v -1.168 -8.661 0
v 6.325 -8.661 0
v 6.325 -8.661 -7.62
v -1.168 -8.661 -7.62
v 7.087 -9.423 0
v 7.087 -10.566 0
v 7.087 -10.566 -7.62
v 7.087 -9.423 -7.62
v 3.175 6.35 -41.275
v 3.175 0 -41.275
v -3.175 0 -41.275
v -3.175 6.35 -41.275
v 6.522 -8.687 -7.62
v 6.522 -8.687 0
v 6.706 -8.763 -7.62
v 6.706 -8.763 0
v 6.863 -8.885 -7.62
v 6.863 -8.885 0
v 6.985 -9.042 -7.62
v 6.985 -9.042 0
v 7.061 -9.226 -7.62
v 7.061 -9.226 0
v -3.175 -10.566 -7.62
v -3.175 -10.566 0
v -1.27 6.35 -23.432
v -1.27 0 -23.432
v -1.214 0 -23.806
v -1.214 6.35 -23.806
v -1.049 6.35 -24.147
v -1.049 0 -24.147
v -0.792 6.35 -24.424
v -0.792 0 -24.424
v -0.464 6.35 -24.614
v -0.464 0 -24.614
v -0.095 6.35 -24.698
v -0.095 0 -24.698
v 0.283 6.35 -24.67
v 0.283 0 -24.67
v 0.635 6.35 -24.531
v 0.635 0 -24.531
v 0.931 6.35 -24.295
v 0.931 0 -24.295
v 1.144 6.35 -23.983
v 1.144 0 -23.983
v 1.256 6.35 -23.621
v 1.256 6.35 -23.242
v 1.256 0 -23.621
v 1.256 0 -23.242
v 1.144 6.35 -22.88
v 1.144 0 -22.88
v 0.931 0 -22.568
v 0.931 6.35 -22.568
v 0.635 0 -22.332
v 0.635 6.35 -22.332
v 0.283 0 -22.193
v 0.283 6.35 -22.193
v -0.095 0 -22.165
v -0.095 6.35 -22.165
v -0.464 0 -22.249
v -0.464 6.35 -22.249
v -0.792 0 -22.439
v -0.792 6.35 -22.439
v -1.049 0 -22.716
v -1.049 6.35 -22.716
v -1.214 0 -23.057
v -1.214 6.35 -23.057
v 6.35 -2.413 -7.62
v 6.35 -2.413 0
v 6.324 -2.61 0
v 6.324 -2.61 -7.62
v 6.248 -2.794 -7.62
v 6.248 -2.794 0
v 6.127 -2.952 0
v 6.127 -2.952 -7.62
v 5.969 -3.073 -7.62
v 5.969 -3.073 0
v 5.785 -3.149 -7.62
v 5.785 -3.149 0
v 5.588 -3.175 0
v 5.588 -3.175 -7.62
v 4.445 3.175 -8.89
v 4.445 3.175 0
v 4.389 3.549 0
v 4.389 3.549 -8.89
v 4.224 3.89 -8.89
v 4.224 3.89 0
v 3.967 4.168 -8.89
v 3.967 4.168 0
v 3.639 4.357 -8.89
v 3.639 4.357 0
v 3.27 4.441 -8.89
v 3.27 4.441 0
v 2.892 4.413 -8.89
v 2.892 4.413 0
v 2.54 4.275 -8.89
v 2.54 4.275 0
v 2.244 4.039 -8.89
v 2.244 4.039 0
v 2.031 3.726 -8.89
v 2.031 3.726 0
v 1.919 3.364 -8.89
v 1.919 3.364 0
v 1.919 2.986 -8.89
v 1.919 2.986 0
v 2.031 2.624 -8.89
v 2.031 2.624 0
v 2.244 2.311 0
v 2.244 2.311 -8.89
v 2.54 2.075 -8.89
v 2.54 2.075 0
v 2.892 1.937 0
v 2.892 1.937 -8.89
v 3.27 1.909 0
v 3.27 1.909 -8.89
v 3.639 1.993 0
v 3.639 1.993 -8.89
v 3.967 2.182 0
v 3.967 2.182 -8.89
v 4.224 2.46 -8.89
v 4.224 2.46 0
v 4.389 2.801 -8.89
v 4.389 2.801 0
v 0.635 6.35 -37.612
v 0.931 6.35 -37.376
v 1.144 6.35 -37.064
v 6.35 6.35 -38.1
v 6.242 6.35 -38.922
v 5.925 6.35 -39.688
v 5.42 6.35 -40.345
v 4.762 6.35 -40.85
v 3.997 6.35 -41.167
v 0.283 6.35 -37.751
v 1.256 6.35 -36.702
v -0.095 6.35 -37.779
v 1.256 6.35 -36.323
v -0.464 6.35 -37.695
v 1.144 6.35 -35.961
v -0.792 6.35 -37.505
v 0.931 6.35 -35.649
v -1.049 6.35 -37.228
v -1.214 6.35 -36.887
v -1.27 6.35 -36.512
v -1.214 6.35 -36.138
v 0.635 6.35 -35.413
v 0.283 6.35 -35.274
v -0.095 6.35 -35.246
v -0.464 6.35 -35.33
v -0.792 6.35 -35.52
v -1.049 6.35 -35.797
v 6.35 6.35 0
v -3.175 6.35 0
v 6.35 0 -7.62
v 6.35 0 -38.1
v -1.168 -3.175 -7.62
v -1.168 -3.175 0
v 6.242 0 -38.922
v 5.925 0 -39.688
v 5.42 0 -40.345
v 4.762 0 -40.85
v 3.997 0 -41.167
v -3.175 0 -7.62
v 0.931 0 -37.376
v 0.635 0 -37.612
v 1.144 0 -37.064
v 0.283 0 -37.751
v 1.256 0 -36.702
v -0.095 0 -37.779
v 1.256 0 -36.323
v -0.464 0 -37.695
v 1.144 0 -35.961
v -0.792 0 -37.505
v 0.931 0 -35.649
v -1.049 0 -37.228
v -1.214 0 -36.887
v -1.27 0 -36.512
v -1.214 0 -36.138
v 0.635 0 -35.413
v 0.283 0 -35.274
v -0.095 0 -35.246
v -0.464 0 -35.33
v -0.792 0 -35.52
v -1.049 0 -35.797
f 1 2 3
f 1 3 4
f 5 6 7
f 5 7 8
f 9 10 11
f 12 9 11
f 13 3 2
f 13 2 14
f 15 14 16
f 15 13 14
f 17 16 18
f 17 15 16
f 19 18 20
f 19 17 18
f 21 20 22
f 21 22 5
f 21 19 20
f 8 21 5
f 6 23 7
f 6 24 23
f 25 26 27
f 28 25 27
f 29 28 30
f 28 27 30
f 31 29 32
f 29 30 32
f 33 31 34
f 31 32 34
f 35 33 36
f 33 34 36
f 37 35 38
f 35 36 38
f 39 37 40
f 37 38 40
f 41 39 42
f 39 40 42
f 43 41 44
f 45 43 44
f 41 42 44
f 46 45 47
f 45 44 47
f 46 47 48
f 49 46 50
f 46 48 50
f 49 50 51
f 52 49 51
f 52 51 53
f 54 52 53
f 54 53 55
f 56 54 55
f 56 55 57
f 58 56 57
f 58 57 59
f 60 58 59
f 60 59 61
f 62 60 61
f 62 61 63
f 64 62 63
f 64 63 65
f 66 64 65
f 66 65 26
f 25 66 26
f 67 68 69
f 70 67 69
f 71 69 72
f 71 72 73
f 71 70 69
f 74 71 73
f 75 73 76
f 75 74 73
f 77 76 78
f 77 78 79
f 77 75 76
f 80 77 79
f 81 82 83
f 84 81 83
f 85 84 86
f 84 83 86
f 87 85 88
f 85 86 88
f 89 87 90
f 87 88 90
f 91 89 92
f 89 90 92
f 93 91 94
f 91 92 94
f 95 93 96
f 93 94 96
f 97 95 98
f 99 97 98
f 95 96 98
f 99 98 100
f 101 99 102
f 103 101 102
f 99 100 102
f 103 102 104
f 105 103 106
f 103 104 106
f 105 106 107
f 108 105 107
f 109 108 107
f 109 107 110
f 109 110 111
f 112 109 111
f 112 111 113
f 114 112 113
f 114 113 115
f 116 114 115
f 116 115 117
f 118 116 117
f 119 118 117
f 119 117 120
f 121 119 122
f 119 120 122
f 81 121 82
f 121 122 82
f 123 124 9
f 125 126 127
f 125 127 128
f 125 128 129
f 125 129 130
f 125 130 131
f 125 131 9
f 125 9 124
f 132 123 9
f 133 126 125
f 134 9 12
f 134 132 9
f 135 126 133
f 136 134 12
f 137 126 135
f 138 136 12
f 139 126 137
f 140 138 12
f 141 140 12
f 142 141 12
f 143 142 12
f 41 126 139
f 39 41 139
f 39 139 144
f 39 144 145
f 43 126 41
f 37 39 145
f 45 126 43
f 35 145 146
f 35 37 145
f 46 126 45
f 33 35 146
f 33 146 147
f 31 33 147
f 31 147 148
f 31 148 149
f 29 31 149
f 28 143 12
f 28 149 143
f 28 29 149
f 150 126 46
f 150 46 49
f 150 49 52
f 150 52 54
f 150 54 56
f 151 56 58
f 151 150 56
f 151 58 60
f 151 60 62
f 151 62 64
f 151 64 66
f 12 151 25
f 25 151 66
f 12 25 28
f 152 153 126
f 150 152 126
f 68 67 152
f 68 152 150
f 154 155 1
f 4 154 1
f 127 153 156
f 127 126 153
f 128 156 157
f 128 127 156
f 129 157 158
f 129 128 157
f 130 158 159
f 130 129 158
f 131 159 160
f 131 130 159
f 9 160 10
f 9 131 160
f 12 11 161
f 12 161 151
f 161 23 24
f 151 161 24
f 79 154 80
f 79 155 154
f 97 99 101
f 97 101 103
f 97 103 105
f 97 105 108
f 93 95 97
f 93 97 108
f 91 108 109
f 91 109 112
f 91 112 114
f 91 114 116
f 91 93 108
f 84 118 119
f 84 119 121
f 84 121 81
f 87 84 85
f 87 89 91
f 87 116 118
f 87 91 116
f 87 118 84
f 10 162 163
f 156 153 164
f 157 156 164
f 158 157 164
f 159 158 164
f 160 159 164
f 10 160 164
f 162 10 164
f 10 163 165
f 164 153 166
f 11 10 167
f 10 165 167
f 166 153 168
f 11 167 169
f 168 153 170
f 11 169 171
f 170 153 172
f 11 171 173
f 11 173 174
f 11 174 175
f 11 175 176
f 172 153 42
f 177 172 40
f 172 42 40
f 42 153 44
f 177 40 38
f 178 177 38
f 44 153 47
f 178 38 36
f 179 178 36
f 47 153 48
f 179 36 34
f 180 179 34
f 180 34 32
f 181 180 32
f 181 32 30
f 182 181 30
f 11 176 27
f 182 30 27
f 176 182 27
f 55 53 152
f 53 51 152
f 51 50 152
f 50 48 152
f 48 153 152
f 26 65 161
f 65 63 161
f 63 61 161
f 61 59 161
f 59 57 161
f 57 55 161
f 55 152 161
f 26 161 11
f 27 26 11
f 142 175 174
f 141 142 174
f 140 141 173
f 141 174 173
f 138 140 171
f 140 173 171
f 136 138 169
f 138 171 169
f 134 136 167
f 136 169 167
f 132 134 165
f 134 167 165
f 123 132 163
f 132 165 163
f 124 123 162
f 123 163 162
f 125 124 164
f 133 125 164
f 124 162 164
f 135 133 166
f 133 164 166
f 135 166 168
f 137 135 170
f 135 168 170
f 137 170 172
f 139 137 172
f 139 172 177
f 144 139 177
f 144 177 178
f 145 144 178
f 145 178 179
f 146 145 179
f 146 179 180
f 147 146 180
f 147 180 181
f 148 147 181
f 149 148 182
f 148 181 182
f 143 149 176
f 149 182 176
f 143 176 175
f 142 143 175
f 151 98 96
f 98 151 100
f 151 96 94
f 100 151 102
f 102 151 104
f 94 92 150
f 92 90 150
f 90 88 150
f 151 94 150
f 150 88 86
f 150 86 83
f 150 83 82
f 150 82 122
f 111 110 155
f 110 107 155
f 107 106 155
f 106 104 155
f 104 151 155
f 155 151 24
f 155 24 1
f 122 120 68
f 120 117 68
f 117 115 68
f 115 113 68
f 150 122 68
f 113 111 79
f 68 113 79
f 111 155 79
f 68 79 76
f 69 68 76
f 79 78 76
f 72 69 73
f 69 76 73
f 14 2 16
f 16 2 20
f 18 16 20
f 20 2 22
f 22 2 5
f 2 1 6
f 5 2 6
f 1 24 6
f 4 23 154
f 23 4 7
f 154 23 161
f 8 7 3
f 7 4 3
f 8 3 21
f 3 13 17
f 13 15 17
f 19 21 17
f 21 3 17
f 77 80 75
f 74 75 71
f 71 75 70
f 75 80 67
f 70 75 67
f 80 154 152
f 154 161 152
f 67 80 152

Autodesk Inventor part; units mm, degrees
ref_plane "YZ Plane" through (0, 0, 0) normal (1, 0, 0) x (0, 1, 0)
ref_plane "XZ Plane" through (0, 0, 0) normal (0, 1, 0) x (-1, 0, 0)
ref_plane "XY Plane" through (0, 0, 0) normal (0, 0, 1) x (1, 0, 0)
sketch "Sketch1" plane through (0, 0, 0) normal (0, 1, 0) x (-1, 0, 0)
  line L0 (0, 0) -> (0, -41.275)
  line L1 (0, -41.275) -> (0, -36.5125)
  line L2 (0, -36.5125) -> (0, -23.4315)
  circle A0 centre (0, -36.5125) radius 1.27
  circle A1 centre (0, -23.4315) radius 1.27
  line L3 (0, -41.275) -> (3.175, -41.275)
  line L4 (3.175, -41.275) -> (3.175, 0)
  line L5 (3.175, 0) -> (0, 0)
  line L6 (0, -41.275) -> (-6.35, -41.275)
  line L7 (-6.35, -41.275) -> (-6.35, 0)
  line L8 (-6.35, 0) -> (0, 0)
  dimension "d0" = 41.275
  dimension "d1" = 4.7625
  dimension "d2" = 13.081
  dimension "d3" = 2.54
  dimension "d4" = 2.54
  dimension "d5" = 3.175
  dimension "d6" = 6.35
extrude "Extrusion1" add sketch "Sketch1" along normal blind 6.35
extrude "Extrusion2" cut sketch "Sketch1" along normal blind 6.35 contours A1 L0 | L0 A1 | A0 L0 | L0 A0
sketch "Sketch3" plane through (-3.175, 0, 0) normal (0, 0, 1) x (1, 0, 0)
  line L0 (0, 0) -> (9.525, 0) projected
  line L1 (9.525, 0) -> (9.525, 6.35) projected
  line L2 (0, 6.35) -> (9.525, 6.35) projected
  line L3 (0, 0) -> (0, 6.35) projected
  circle A0 centre (6.35, 3.175) radius 1.27
  line L4 (6.35, 3.175) -> (2.0066, 3.175)
  line L5 (2.0066, 3.175) -> (2.0066, 0)
  line L6 (9.525, 0) -> (0, 0) projected
  line L7 (6.35, 3.175) -> (6.35, -8.6614)
  line L8 (2.0066, 0) -> (2.0066, -8.6614)
  line L9 (2.0066, -8.6614) -> (2.0066, -10.5664)
  line L10 (2.0066, -10.5664) -> (10.2616, -10.5664)
  line L11 (10.2616, -10.5664) -> (10.2616, -8.6614)
  line L12 (10.2616, -8.6614) -> (6.35, -8.6614)
  line L13 (0, 0) -> (0, -10.5664)
  line L14 (0, -10.5664) -> (2.0066, -10.5664)
  line L15 (0, 0) -> (2.0066, 0)
  line L16 (6.35, -8.6614) -> (2.0066, -8.6614)
  line L17 (2.0066, -8.6614) -> (2.0066, 0)
  line L18 (6.35, 3.175) -> (6.35, -3.175)
  line L19 (9.525, 0) -> (2.0066, 0)
  line L20 (2.0066, 0) -> (2.0066, -3.175)
  line L21 (2.0066, -3.175) -> (9.525, -3.175)
  line L22 (9.525, -3.175) -> (9.525, 0)
  point P0 (3.175, 0)
  dimension "d11" = 2.54
  dimension "d14" = 3.175
  dimension "d15" = 9.525
  dimension "d16" = 4.3434
  dimension "d17" = 11.8364
  dimension "d18" = 1.905
  dimension "d19" = 8.255
  dimension "d22" = 6.35
extrude "Extrusion3" cut sketch "Sketch3" against normal blind 8.89 contours L7 L4 A0 | A0 L4 L7
extrude "Extrusion4" add sketch "Sketch3" against normal blind 7.62 contours L0 L8 L9 L14 L13 | L9 L16 L12 L11 L10
extrude "Extrusion5" add sketch "Sketch3" against normal blind 7.62 contours L0 L7 L21 L8 | L0 L22 L21 L7
fillet "Fillet1" radius 3.175 1 edges at (6.35, 3.175, -41.275)
fillet "Fillet2" radius 0.762 2 edges at (6.35, -3.175, -3.81) (7.0866, -8.6614, -3.81)
properties part number "photoTransistorHolderRight"
